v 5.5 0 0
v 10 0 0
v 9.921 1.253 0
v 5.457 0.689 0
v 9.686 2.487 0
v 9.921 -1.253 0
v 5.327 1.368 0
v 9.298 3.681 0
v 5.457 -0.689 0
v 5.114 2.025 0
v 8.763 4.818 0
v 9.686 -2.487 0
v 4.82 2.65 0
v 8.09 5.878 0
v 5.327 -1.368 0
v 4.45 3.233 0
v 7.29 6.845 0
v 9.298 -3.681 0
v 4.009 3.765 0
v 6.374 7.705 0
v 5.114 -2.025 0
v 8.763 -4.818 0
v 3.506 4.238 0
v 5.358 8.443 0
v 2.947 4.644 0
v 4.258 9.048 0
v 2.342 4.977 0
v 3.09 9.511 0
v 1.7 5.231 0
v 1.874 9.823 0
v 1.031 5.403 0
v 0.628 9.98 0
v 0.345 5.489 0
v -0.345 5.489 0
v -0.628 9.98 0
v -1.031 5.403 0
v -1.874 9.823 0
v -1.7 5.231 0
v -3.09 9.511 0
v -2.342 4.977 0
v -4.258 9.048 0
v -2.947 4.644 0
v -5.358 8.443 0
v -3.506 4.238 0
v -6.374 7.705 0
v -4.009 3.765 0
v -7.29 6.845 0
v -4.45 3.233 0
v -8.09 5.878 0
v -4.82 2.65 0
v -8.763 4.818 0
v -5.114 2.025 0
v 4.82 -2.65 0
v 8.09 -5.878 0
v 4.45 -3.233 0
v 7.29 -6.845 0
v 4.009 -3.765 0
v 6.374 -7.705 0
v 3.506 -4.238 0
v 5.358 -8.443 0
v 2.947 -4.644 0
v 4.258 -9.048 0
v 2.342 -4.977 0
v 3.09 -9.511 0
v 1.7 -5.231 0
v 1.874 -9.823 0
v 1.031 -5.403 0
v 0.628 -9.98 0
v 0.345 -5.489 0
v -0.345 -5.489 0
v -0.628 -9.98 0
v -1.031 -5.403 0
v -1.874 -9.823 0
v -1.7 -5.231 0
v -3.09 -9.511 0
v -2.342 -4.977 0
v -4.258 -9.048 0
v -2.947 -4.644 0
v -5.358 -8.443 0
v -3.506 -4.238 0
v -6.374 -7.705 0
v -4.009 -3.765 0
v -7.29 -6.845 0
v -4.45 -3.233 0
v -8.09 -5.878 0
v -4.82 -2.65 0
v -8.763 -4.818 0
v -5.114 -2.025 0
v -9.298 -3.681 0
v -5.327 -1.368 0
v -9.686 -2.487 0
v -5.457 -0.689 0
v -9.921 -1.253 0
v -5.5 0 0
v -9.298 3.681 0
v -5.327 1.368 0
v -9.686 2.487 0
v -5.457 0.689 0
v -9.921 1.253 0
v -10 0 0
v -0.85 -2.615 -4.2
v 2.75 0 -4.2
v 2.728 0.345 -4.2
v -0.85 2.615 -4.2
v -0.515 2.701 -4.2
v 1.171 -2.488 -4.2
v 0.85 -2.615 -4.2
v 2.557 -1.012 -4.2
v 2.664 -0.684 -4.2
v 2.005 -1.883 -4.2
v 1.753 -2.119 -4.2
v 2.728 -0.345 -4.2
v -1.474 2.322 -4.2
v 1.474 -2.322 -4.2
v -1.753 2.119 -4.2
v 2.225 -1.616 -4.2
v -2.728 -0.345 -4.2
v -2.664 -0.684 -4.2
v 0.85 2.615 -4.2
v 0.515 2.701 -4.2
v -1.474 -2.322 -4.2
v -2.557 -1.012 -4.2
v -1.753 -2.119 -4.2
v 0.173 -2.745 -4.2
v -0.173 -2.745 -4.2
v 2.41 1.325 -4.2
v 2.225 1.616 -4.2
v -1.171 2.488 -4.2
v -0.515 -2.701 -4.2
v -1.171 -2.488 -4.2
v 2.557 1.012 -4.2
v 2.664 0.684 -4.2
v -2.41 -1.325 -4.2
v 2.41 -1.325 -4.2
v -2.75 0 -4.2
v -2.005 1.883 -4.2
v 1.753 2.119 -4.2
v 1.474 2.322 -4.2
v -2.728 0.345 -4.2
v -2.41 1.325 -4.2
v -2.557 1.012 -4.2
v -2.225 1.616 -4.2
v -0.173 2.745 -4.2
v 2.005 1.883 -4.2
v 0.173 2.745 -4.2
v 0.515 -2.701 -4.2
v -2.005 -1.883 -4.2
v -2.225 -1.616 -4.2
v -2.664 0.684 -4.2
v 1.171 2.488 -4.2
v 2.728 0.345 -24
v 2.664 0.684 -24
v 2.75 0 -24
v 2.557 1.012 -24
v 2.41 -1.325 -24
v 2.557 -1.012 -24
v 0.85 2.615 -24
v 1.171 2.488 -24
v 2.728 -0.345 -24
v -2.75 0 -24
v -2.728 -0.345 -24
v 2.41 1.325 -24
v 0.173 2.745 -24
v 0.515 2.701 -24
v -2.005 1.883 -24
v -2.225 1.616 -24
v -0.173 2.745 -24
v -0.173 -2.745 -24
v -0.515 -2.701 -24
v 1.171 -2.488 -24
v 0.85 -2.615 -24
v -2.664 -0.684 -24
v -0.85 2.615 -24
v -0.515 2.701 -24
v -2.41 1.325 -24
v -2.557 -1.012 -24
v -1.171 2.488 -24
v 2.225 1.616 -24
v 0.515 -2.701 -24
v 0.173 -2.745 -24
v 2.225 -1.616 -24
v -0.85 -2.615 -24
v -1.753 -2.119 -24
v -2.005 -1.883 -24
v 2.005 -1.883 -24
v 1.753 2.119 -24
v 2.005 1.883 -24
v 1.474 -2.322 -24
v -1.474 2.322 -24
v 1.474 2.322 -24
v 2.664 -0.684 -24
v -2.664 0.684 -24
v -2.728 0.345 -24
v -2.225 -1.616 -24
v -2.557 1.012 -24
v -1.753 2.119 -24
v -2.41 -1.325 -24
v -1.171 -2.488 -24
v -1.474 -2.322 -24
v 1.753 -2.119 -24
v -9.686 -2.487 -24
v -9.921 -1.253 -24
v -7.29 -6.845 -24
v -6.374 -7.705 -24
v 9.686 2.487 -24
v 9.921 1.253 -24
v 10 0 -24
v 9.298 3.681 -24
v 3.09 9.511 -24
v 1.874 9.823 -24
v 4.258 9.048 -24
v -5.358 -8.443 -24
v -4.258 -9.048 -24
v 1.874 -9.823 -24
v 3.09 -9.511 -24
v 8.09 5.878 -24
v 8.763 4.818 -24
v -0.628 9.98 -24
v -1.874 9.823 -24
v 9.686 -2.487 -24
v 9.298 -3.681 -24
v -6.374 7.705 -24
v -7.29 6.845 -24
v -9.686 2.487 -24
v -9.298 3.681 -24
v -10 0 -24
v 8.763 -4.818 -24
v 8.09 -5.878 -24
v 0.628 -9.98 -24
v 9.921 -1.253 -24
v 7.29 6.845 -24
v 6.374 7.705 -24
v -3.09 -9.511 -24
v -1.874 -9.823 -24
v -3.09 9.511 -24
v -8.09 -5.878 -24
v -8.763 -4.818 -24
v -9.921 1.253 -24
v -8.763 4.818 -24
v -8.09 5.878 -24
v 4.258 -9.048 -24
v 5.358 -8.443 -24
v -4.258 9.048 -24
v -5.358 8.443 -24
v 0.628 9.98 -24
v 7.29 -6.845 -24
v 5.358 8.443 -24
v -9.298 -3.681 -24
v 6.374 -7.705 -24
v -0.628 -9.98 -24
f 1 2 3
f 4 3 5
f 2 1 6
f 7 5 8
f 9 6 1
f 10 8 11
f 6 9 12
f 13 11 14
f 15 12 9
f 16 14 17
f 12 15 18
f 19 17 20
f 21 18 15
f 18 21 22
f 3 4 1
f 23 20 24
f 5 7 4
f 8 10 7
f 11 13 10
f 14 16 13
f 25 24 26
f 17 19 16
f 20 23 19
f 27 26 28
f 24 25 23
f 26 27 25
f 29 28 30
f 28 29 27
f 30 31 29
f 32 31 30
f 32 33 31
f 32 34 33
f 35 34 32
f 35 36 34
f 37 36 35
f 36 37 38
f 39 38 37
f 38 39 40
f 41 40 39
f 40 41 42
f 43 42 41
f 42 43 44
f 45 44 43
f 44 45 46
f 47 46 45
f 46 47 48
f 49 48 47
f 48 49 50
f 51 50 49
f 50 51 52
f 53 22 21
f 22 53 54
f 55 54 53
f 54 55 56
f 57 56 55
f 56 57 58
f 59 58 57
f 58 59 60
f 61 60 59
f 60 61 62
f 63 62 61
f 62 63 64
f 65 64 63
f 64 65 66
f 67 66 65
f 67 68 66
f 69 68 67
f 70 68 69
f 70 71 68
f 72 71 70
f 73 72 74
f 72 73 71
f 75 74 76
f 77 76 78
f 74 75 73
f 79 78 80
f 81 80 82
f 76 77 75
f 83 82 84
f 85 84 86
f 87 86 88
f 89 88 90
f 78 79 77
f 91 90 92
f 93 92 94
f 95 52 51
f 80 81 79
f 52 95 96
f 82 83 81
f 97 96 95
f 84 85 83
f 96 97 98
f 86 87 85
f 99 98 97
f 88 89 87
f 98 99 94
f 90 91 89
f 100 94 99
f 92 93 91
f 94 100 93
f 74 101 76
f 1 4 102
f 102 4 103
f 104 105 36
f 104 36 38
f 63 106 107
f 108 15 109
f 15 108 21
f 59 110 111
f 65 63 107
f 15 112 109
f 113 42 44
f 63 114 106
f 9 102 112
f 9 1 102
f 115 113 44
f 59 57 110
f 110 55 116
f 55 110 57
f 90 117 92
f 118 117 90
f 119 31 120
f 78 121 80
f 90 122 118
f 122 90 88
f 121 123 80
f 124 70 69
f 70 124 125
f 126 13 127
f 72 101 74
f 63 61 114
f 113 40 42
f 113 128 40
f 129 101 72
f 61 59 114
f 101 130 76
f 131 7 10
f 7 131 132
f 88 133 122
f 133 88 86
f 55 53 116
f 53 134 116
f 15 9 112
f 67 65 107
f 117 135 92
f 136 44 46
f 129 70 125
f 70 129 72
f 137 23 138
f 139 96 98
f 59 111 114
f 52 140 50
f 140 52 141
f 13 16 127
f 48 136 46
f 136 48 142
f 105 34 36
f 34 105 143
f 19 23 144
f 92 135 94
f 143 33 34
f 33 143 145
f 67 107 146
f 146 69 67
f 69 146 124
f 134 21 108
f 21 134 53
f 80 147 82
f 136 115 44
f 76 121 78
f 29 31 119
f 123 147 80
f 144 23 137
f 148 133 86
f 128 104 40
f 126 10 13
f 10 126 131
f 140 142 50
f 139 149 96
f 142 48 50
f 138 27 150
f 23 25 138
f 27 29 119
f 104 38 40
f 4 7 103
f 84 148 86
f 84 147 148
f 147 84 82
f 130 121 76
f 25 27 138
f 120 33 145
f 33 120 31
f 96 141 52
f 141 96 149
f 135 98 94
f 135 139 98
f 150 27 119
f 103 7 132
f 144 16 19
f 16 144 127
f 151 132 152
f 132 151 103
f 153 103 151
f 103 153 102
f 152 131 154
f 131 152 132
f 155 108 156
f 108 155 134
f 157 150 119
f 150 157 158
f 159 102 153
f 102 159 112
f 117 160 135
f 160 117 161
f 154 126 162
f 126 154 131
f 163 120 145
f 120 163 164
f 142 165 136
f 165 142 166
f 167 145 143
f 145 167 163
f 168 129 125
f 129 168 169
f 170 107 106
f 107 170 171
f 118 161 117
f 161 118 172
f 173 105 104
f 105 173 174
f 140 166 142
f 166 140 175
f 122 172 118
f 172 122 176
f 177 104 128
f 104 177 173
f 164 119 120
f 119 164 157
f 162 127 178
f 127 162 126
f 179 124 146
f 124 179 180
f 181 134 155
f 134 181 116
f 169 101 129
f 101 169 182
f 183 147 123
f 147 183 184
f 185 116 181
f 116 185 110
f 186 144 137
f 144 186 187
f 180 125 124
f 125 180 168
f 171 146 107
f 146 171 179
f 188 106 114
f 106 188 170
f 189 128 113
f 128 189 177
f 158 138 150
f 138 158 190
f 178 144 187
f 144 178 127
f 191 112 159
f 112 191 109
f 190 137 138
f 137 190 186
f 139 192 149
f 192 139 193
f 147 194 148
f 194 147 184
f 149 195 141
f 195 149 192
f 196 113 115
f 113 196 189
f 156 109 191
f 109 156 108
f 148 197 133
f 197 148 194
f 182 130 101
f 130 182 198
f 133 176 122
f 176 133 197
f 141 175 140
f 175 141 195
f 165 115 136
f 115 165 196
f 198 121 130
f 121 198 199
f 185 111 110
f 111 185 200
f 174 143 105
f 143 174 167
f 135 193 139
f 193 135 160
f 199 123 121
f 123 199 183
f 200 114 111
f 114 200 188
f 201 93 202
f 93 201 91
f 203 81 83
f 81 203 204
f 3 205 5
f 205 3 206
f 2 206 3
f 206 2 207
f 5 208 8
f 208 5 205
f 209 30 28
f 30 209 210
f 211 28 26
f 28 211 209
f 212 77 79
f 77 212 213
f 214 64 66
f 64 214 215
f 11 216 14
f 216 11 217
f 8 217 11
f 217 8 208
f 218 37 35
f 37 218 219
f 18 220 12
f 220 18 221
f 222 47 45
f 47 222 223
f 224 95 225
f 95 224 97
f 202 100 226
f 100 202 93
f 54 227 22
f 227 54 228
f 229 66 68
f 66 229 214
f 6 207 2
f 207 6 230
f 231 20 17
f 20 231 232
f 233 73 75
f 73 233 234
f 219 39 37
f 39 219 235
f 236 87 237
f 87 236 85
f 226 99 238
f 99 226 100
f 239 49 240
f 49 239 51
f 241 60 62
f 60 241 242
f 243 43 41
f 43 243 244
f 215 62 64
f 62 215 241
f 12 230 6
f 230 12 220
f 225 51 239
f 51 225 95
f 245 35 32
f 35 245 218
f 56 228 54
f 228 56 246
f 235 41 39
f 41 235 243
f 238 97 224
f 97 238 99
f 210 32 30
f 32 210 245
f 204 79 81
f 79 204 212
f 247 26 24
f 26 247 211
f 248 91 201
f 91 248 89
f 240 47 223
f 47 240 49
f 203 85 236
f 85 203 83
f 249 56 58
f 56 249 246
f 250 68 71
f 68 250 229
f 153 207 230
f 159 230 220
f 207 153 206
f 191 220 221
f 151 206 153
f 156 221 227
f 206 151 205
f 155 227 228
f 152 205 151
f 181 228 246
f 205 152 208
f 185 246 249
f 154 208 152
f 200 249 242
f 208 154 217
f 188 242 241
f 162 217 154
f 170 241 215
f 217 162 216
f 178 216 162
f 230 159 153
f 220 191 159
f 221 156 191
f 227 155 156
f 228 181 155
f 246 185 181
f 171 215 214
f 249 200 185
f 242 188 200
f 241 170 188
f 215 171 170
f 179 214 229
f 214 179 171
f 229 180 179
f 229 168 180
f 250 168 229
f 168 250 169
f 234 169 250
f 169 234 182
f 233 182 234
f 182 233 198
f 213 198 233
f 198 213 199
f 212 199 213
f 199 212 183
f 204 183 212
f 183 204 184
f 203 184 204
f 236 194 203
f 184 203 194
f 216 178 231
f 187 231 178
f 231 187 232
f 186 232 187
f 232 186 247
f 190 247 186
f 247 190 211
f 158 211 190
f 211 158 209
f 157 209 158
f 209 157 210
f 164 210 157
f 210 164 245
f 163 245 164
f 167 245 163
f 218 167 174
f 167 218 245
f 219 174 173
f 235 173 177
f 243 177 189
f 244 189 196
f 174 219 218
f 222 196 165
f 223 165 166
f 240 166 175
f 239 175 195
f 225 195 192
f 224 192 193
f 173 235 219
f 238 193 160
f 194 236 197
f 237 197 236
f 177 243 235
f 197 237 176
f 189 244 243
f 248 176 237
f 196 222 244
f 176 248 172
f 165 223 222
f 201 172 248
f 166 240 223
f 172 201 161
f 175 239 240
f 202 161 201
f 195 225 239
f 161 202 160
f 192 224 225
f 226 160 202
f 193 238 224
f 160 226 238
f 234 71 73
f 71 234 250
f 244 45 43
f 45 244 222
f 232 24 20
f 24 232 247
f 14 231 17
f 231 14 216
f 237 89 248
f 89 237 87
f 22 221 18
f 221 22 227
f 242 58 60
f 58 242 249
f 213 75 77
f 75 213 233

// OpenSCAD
$fn = 50;


difference() {
	union() {
		translate(v = [0, 0, -24.0000000000]) {
			cylinder(h = 24, r = 10.0000000000);
		}
	}
	union() {
		translate(v = [0, 0, 0]) {
			rotate(a = [0, 0, 0]) {
				difference() {
					union() {
						translate(v = [0, 0, -27.0000000000]) {
							cylinder(h = 27, r = 2.2500000000);
						}
						translate(v = [0, 0, -4.2000000000]) {
							cylinder(h = 4.2000000000, r1 = 2.7500000000, r2 = 5.5000000000);
						}
						translate(v = [0, 0, -27.0000000000]) {
							cylinder(h = 27, r = 2.7500000000);
						}
						translate(v = [0, 0, -27.0000000000]) {
							cylinder(h = 27, r = 2.2500000000);
						}
					}
					union();
				}
			}
		}
	}
}
